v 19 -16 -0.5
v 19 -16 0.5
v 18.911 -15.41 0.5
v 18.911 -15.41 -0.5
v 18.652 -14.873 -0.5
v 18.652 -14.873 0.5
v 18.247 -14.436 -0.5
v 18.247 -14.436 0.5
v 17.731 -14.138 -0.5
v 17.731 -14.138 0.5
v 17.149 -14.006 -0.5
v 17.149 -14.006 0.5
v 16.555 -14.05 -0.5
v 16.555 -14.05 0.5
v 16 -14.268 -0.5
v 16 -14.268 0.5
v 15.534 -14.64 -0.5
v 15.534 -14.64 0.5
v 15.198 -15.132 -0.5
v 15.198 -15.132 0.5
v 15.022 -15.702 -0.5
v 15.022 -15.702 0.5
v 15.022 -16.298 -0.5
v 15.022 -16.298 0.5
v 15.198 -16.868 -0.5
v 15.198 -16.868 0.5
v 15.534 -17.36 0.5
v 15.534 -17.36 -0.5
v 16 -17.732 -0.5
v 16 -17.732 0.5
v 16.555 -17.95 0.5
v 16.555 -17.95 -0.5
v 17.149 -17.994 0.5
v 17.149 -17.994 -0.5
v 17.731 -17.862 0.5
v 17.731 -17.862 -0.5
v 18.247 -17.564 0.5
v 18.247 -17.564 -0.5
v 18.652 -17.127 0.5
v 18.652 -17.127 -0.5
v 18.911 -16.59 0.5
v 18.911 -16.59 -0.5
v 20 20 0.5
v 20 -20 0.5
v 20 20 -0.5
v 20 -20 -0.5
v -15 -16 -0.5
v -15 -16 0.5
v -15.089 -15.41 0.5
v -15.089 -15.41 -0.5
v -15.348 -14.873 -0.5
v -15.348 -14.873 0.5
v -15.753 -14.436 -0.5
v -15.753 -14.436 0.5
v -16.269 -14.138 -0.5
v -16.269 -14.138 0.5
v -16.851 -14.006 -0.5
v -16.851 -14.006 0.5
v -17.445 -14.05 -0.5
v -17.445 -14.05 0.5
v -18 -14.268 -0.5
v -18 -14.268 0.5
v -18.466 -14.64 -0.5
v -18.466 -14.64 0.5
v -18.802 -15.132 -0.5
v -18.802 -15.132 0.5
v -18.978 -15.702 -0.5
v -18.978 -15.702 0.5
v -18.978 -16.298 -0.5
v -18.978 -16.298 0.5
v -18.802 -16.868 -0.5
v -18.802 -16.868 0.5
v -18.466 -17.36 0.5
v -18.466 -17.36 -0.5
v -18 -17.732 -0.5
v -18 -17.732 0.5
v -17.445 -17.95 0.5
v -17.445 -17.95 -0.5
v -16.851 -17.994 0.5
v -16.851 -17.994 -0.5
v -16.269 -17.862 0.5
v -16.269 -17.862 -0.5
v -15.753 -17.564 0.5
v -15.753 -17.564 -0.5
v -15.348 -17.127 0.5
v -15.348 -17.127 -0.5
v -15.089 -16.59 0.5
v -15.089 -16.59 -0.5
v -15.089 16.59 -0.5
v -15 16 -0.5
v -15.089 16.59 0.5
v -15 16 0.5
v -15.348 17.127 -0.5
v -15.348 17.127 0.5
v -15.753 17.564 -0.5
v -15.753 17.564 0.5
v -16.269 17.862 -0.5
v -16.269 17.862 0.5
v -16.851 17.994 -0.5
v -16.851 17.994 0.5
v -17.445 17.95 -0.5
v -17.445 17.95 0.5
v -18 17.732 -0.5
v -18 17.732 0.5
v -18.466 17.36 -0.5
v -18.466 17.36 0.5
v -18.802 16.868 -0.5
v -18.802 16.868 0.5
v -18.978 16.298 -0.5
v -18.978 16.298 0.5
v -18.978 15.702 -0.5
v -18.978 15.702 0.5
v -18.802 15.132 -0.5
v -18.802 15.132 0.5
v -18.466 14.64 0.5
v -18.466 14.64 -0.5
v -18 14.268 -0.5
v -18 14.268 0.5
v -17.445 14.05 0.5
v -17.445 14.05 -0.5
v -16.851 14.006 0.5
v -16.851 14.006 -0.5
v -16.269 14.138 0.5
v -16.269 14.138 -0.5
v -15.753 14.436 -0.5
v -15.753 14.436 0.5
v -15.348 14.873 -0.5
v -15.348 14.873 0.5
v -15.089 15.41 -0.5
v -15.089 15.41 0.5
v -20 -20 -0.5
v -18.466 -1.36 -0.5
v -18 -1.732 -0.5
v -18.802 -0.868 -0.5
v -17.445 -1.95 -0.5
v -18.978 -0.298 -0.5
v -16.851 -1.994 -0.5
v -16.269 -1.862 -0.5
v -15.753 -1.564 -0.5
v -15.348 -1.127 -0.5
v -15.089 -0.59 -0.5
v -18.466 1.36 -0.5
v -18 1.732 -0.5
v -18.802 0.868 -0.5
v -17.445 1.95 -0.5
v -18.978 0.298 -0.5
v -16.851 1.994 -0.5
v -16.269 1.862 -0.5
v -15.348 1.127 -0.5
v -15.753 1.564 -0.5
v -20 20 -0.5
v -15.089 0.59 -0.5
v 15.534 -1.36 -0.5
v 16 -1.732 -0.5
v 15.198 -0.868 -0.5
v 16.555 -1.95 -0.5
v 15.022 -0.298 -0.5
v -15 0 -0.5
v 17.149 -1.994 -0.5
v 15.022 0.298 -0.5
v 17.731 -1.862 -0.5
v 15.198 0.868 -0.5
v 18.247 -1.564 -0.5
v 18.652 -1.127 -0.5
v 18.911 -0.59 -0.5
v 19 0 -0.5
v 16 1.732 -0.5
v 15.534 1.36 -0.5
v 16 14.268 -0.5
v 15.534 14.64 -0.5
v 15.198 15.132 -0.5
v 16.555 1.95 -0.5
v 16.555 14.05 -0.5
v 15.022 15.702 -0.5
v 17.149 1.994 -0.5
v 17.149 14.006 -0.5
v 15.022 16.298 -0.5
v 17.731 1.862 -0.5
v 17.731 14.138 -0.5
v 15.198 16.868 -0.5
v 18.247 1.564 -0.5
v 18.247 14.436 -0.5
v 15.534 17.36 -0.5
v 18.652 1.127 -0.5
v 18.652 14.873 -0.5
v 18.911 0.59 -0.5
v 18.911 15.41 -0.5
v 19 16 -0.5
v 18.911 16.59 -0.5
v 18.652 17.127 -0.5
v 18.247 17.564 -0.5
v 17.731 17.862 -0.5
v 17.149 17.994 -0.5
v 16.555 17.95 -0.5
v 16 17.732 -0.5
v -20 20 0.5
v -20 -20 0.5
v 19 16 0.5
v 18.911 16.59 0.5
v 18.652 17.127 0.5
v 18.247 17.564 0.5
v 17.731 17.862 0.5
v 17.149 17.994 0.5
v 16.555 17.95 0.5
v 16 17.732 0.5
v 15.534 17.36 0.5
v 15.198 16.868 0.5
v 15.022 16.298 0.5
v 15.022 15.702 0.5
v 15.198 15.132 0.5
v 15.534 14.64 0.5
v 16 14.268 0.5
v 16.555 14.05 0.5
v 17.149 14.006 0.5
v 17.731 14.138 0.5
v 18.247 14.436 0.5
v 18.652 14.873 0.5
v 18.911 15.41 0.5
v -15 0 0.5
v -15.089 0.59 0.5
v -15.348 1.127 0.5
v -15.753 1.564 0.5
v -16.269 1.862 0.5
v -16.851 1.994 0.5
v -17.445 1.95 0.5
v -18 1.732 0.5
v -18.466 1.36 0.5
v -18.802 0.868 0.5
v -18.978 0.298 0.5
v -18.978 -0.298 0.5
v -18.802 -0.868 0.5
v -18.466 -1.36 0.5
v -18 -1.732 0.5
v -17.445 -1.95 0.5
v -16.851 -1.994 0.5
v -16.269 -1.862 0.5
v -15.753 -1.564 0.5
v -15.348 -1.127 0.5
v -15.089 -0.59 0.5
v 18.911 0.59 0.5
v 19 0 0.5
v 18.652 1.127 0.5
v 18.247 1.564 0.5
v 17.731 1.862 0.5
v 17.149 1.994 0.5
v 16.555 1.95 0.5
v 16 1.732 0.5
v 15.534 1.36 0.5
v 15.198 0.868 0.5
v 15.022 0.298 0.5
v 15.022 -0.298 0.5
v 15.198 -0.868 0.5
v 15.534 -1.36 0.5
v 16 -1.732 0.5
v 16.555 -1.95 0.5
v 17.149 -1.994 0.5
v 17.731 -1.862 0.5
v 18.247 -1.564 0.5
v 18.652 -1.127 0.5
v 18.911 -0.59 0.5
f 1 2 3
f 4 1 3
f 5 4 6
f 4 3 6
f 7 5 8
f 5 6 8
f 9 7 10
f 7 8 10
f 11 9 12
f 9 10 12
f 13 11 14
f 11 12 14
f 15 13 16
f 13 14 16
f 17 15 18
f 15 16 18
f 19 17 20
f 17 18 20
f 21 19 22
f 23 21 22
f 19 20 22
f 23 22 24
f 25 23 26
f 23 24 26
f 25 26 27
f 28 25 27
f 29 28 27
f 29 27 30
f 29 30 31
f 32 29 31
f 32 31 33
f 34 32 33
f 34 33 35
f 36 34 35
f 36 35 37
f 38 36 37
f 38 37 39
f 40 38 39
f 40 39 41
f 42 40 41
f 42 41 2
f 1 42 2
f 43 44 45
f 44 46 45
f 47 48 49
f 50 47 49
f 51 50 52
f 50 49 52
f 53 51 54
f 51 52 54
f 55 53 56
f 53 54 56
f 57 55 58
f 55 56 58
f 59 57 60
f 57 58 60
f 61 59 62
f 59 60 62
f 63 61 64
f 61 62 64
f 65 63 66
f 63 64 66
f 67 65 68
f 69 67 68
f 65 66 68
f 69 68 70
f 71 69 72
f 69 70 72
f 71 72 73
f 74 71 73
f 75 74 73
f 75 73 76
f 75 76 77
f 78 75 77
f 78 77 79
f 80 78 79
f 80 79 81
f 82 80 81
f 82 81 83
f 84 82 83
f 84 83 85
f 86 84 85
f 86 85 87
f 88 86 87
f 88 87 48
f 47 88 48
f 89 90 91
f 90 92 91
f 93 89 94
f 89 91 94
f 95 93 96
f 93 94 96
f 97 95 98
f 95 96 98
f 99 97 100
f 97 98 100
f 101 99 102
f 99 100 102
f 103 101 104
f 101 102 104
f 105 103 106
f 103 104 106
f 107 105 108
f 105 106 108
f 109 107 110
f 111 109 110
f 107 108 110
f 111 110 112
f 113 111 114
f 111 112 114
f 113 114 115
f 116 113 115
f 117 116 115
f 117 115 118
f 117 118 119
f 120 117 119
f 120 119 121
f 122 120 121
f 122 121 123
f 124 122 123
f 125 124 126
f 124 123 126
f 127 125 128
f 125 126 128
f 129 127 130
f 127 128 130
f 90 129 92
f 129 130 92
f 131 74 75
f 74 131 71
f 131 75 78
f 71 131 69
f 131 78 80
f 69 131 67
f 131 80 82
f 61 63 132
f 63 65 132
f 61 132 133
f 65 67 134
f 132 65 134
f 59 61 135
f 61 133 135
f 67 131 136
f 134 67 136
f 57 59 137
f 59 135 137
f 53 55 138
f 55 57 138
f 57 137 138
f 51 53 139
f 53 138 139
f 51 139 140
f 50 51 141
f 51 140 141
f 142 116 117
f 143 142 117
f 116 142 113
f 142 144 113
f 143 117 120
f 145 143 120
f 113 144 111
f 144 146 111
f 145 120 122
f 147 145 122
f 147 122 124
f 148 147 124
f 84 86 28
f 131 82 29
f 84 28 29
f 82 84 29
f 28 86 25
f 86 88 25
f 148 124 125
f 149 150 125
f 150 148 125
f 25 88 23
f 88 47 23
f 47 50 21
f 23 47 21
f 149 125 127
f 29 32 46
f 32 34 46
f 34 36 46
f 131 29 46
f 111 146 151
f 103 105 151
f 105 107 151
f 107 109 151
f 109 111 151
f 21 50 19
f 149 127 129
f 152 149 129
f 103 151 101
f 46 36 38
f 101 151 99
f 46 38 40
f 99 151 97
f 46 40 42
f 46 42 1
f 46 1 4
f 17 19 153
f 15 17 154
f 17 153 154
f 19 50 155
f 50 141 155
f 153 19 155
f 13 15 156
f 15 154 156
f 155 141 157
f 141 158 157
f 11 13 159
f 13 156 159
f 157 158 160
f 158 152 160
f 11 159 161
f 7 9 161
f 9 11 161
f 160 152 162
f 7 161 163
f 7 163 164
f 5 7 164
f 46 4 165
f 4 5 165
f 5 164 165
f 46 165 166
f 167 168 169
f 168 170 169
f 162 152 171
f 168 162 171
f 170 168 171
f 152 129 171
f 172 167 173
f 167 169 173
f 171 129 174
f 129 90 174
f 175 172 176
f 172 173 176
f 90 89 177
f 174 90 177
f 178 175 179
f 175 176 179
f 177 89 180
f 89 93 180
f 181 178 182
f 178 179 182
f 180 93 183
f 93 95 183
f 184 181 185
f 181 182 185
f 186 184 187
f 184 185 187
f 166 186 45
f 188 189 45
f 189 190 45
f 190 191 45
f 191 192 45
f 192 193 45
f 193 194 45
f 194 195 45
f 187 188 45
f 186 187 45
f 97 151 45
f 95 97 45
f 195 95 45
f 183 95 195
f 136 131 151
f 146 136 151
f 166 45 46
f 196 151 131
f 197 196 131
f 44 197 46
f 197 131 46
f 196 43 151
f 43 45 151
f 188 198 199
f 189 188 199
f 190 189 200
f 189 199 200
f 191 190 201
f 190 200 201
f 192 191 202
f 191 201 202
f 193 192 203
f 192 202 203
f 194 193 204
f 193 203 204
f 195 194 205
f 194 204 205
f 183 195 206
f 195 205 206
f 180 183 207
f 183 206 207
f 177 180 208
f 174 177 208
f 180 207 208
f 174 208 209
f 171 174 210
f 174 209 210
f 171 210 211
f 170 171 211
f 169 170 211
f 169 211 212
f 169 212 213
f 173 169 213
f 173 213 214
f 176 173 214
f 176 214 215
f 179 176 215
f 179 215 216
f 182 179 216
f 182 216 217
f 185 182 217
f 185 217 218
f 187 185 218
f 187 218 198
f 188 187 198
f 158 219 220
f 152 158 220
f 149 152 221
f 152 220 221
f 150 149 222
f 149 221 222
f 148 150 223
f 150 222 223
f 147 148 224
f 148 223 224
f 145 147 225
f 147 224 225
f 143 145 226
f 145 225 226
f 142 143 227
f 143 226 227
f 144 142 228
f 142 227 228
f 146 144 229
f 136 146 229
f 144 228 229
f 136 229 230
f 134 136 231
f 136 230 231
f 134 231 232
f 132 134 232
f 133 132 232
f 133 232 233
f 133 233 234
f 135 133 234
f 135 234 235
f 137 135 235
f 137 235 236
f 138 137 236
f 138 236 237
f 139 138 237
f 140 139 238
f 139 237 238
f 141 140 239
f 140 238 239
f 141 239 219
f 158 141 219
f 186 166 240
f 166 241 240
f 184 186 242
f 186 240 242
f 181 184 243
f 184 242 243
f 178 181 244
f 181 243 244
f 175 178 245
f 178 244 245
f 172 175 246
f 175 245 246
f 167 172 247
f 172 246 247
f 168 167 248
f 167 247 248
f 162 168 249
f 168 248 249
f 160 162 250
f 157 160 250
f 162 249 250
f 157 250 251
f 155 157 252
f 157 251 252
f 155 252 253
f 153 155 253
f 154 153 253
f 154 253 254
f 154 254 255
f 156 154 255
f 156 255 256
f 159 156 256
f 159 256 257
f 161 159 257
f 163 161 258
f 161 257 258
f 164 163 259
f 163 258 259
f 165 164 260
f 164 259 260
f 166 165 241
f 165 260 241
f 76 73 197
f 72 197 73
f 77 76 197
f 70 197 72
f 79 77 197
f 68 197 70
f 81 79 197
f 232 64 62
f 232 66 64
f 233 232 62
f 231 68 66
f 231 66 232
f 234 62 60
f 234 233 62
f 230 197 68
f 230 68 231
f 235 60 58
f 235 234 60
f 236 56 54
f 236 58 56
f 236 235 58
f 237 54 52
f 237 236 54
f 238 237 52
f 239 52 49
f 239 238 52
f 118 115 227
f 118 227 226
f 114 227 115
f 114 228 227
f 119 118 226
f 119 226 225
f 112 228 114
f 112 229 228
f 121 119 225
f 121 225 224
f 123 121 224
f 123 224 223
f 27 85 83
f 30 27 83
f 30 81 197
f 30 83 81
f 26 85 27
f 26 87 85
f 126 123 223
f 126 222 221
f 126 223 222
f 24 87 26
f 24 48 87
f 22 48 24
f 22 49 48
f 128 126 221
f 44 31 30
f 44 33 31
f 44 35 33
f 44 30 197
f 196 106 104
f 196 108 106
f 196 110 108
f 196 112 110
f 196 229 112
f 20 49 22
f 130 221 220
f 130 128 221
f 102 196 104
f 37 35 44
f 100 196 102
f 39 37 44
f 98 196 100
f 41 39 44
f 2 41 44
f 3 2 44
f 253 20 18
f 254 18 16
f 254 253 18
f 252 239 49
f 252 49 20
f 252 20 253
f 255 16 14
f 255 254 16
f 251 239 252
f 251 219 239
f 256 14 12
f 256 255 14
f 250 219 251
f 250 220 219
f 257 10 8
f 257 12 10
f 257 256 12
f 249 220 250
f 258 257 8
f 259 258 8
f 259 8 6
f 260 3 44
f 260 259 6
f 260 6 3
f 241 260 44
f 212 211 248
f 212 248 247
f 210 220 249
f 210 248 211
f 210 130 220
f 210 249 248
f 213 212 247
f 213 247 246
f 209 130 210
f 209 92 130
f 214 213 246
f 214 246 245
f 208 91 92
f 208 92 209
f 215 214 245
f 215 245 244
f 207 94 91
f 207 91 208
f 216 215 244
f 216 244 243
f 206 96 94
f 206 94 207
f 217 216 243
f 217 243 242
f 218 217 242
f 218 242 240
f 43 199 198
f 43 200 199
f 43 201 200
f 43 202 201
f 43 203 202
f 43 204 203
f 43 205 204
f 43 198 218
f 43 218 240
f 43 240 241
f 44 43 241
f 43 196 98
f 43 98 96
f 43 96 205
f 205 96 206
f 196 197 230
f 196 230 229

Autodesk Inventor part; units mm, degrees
ref_plane "YZ Plane" through (0, 0, 0) normal (1, 0, 0) x (0, 1, 0)
ref_plane "XZ Plane" through (0, 0, 0) normal (0, 1, 0) x (-1, 0, 0)
ref_plane "XY Plane" through (0, 0, 0) normal (0, 0, 1) x (1, 0, 0)
sketch "Sketch1" plane through (0, 0, 0) normal (0, 0, 1) x (1, 0, 0)
  line L0 (-20, -20) -> (20, -20)
  line L1 (20, -20) -> (20, 20)
  line L2 (20, 20) -> (-20, 20)
  line L3 (-20, 20) -> (-20, -20)
  line L4 (-20, -20) -> (20, 20) construction
  line L5 (20, -20) -> (-20, 20) construction
  point P0 (0, 0)
  dimension "d0" = 40
  dimension "d1" = 40
extrude "Extrusion1" add sketch "Sketch1" along normal mid plane 1
sketch "Sketch2" plane through (0, 0, 0.5) normal (0, 0, 1) x (1, 0, 0)
  circle A0 centre (-17, 16) radius 2
  circle A1 centre (-17, 0) radius 2
  circle A2 centre (-17, -16) radius 2
  circle A3 centre (17, 16) radius 2
  circle A4 centre (17, 0) radius 2
  circle A5 centre (17, -16) radius 2
  line L0 (-20, 20) -> (-20, -20) projected
  point P0 (0, 0)
  dimension "d4" = 3
  dimension "d5" = 34
  dimension "d6" = 4
  dimension "d7" = 4
  dimension "d8" = 4
  dimension "d9" = 16
  dimension "d10" = 32
extrude "Extrusion2" cut sketch "Sketch2" against normal up to surface (1 mm away)
equation "\"d7\" = d6"
equation "\"d8\" = d6"
equation "\"d9\" = 0.5 * d10"
properties part number "26A" material "Gold"
